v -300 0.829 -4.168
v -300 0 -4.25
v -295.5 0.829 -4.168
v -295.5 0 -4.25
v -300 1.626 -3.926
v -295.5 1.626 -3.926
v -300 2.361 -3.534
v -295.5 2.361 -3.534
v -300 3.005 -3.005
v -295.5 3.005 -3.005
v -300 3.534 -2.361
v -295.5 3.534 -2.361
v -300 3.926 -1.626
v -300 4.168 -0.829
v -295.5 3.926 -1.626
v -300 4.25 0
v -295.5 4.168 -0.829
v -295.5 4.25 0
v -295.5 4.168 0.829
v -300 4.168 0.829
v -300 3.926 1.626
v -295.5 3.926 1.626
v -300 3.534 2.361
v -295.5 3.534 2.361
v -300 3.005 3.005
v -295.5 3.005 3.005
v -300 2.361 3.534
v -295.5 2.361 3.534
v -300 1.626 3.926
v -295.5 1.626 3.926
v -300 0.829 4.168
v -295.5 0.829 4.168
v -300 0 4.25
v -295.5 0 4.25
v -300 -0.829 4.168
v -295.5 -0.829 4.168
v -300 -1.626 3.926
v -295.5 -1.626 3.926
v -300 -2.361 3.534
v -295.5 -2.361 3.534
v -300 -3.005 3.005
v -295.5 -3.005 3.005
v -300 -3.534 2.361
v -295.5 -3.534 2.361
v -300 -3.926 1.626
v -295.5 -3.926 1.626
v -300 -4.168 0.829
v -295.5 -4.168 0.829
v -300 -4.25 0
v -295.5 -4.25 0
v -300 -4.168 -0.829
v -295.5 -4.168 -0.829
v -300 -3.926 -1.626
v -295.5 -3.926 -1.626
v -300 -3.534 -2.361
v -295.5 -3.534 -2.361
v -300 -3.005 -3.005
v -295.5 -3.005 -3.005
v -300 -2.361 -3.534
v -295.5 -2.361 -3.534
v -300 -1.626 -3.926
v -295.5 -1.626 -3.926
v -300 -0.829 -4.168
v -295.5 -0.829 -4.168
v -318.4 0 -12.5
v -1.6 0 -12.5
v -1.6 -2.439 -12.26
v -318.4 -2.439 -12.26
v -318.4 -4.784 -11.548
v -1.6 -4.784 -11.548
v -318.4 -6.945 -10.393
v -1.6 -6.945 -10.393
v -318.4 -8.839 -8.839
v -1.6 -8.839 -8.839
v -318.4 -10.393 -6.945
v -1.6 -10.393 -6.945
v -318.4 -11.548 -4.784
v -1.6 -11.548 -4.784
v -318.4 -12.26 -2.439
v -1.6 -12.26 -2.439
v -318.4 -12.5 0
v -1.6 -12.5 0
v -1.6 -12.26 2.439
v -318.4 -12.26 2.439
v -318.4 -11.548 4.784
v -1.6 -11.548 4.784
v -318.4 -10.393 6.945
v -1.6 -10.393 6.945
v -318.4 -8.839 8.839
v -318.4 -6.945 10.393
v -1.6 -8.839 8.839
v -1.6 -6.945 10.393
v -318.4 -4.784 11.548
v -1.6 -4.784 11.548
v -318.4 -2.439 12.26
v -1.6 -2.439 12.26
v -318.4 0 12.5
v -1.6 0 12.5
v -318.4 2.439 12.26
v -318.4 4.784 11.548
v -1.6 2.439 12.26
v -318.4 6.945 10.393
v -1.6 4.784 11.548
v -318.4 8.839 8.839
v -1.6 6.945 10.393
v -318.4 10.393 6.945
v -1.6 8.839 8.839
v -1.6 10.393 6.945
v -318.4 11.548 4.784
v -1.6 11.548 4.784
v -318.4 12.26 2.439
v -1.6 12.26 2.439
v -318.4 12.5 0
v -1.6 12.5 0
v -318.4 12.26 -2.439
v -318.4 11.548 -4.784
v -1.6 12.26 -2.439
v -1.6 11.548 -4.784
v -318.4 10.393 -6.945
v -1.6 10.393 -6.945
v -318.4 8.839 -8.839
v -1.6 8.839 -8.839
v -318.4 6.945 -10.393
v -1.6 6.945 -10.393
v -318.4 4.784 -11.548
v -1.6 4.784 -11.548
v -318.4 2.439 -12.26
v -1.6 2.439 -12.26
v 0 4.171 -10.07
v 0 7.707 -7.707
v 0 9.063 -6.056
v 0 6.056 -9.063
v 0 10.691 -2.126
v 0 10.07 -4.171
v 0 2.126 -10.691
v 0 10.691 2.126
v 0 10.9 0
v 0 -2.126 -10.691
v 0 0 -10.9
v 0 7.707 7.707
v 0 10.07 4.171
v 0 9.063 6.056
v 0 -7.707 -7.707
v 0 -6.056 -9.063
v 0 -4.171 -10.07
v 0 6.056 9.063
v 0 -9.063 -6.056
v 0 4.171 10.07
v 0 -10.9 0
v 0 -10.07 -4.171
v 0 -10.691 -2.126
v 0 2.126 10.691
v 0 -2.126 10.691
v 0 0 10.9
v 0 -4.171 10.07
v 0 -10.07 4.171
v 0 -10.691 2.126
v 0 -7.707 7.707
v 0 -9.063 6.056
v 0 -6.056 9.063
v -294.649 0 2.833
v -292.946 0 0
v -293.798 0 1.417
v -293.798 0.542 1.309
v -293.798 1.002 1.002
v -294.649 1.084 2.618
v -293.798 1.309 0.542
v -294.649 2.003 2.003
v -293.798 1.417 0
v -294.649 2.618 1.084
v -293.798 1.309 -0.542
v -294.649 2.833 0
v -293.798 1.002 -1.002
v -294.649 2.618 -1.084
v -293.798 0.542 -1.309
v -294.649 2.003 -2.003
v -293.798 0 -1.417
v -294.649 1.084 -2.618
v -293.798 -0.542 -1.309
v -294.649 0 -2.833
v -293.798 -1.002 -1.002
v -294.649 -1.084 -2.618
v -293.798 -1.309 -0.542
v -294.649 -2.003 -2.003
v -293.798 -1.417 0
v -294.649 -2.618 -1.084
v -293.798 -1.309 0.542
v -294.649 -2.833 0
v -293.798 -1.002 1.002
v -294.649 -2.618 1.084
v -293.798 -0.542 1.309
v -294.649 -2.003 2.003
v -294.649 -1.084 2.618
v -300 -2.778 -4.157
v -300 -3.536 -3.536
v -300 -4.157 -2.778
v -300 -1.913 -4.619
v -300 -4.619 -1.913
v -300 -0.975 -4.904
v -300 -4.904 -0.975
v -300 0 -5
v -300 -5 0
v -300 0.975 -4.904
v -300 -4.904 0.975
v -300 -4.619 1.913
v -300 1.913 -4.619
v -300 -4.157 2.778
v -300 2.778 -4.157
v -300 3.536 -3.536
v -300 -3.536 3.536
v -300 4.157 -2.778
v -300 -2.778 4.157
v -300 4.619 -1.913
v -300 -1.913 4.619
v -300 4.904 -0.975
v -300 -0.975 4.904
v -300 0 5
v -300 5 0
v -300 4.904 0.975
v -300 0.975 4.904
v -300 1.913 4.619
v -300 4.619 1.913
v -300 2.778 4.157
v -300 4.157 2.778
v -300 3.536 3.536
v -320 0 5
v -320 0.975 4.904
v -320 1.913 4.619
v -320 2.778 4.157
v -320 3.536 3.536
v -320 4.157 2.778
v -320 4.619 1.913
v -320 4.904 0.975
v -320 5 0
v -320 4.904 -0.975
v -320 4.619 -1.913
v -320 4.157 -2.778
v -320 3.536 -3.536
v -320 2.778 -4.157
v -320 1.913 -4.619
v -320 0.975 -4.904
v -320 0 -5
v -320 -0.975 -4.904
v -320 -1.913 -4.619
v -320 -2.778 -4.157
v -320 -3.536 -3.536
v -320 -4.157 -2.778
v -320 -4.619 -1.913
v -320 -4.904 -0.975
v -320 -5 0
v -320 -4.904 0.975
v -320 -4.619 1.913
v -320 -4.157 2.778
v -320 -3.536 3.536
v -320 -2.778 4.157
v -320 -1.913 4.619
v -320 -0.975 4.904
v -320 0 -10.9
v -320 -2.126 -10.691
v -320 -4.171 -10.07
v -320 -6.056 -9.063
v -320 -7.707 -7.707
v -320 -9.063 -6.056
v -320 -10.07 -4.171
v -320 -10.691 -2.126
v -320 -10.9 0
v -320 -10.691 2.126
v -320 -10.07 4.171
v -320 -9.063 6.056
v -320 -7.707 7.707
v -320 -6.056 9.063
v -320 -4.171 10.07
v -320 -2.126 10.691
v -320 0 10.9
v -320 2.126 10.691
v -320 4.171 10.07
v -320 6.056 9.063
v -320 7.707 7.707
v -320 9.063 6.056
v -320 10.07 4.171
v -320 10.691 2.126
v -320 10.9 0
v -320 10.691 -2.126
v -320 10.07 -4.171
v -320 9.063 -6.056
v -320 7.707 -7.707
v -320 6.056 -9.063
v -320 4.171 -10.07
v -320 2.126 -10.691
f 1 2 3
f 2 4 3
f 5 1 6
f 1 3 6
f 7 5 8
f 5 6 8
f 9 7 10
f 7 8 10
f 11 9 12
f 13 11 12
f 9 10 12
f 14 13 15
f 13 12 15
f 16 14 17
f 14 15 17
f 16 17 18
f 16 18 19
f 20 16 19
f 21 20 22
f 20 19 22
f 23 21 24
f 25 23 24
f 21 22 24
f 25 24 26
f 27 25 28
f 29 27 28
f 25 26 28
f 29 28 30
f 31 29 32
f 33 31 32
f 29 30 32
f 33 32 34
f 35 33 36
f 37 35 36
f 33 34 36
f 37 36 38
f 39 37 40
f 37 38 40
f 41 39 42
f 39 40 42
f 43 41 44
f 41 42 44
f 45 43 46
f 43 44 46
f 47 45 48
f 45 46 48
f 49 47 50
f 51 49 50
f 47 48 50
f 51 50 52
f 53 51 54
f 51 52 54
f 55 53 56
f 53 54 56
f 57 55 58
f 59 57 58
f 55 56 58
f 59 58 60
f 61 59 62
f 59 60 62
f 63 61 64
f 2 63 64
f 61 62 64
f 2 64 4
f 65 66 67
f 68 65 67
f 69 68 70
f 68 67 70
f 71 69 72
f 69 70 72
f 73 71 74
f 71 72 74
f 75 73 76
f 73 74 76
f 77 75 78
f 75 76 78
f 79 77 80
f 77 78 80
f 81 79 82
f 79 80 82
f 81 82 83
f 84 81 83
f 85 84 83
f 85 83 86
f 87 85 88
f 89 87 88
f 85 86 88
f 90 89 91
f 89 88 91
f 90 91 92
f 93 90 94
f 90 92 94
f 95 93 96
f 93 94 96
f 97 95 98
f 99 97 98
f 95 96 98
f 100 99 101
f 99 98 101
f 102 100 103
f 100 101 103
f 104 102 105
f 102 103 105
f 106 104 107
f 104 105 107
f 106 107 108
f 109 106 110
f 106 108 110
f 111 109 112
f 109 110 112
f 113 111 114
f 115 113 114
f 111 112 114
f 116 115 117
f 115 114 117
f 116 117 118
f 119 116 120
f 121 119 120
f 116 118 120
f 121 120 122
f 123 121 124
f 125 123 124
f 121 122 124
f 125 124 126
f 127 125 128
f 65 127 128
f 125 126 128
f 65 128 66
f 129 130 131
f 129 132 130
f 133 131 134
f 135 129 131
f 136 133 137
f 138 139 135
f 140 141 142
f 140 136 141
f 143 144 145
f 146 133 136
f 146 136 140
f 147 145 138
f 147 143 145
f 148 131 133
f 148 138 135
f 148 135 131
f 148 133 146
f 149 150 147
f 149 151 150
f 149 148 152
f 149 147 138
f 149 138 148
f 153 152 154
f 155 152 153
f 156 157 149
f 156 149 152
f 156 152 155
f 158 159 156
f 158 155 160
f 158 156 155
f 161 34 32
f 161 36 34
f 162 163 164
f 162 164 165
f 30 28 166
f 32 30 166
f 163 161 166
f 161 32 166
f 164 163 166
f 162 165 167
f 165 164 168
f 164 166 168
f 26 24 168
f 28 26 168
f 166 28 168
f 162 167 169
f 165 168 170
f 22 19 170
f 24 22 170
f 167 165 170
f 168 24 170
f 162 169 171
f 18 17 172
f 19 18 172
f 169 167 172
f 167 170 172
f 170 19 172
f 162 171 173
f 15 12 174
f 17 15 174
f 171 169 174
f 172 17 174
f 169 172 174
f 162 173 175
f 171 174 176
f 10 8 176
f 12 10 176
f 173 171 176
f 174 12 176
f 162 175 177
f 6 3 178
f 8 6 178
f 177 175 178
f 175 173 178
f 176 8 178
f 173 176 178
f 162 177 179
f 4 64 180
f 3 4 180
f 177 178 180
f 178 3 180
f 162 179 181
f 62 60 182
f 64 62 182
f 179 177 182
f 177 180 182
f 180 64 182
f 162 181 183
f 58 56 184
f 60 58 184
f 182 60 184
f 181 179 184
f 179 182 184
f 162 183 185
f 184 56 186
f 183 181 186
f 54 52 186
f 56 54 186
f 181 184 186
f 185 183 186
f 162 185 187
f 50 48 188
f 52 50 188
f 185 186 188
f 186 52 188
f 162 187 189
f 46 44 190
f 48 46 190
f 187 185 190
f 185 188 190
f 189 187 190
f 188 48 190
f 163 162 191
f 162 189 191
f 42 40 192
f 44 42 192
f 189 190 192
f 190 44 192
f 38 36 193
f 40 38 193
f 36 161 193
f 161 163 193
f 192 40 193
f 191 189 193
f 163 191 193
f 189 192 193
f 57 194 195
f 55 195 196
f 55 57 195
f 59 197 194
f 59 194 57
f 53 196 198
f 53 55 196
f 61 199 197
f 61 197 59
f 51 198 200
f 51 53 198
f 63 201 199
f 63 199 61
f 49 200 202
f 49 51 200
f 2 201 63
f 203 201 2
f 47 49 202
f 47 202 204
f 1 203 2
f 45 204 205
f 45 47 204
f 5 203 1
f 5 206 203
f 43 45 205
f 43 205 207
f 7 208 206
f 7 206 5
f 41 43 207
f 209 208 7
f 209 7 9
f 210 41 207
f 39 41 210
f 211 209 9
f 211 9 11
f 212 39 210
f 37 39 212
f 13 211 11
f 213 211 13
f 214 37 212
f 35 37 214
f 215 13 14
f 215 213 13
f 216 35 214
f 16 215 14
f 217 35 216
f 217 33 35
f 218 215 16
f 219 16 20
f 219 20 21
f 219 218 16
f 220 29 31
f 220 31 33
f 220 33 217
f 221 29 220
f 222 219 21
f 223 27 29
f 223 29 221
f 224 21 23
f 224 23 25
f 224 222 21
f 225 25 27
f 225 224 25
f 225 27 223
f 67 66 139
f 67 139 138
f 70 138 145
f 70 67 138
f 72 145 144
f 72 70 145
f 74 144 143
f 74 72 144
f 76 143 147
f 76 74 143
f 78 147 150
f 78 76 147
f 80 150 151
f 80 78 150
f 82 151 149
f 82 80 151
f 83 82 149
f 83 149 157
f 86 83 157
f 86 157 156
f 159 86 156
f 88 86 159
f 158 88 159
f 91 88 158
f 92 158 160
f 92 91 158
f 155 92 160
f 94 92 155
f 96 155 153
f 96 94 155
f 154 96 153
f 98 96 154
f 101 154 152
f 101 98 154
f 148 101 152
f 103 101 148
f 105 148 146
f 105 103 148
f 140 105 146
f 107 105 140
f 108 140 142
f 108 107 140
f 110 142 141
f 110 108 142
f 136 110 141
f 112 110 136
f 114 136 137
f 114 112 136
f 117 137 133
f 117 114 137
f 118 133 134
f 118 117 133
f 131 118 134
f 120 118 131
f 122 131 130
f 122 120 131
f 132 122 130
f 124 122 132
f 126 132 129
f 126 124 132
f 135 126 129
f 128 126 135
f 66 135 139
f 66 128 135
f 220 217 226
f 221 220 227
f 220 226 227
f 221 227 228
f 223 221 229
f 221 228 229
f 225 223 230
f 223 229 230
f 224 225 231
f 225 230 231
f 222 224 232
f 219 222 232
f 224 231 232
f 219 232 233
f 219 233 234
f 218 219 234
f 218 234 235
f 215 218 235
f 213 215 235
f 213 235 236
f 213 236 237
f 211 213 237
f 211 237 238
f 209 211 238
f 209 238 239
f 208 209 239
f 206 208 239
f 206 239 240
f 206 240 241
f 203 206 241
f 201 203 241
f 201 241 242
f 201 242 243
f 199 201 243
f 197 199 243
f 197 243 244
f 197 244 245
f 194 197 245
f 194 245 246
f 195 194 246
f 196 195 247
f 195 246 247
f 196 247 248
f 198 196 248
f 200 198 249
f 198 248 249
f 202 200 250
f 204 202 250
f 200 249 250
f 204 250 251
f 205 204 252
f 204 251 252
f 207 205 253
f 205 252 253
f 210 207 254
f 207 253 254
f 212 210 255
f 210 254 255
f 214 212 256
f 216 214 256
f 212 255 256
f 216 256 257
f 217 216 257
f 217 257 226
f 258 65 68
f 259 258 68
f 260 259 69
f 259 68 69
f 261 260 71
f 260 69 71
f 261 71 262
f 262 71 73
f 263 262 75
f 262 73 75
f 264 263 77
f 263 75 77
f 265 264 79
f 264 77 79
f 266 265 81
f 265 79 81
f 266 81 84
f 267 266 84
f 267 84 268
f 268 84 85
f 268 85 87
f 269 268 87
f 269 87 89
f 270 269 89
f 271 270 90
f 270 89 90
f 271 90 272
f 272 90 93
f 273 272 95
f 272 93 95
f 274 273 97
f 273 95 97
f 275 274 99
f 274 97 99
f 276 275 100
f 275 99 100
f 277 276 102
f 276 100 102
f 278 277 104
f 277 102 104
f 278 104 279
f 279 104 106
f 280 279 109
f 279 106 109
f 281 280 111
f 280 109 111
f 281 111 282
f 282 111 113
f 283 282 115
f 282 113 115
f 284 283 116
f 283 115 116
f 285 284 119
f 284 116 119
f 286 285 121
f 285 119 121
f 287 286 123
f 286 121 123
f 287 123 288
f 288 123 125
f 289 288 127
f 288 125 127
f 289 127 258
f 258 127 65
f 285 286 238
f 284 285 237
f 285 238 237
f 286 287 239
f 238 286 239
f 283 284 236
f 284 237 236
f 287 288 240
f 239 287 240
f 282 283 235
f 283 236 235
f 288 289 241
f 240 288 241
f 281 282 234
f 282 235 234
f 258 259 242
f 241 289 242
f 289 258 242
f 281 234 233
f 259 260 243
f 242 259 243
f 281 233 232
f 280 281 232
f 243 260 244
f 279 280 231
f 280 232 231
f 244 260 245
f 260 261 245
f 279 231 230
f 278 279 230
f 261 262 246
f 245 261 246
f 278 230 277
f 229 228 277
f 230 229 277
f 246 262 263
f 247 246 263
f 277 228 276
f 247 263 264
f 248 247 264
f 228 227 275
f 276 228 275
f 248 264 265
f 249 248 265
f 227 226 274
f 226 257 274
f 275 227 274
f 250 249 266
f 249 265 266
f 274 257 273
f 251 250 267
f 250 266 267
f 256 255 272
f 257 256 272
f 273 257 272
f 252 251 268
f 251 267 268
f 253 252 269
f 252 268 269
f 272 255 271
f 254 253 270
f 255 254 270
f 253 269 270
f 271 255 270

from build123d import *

# Parameters (mm, degrees)
SKETCH1_W                    = 320
SKETCH1_H                    = 12.5
CHAMFER1_SIZE                = 1.6
M10_TAPPED_HOLE1_D           = 8.5
M10_TAPPED_HOLE1_DEPTH       = 24.5
M10_TAPPED_HOLE1_CBORE_D     = 10
M10_TAPPED_HOLE1_CBORE_DEPTH = 20
M10_TAPPED_HOLE1_TIP         = 2.553657631


with BuildPart() as part:
    # Sketch1 → Revolve1 (revolve)
    with BuildSketch(Plane.XY, mode=Mode.PRIVATE) as revolve1_sk:
        with Locations((-160, 6.25)):
            Rectangle(SKETCH1_W, SKETCH1_H)
    revolve(revolve1_sk.sketch.rotate(Axis((0, 0, 0), (-1, 0, 0)), 90), axis=Axis((0, 0, 0), (-1, 0, 0)))

    # Chamfer1
    chamfer1_edges = [part.edges().sort_by_distance(p)[0] for p in [
        (-320, 0, 12.5),
        (0, 0, 12.5),
    ]]
    chamfer(chamfer1_edges, length=CHAMFER1_SIZE)

    # M10 Tapped Hole1
    with Locations(Plane.ZY.offset(320)):
        with Locations((0, 0)):
            CounterBoreHole(M10_TAPPED_HOLE1_D / 2, M10_TAPPED_HOLE1_CBORE_D / 2, M10_TAPPED_HOLE1_CBORE_DEPTH, depth=M10_TAPPED_HOLE1_DEPTH)
            with Locations((0, 0, -(M10_TAPPED_HOLE1_DEPTH + M10_TAPPED_HOLE1_TIP / 2))):  # 118° drill point
                Cone(0, M10_TAPPED_HOLE1_D / 2, M10_TAPPED_HOLE1_TIP, mode=Mode.SUBTRACT)


solid = part.part
